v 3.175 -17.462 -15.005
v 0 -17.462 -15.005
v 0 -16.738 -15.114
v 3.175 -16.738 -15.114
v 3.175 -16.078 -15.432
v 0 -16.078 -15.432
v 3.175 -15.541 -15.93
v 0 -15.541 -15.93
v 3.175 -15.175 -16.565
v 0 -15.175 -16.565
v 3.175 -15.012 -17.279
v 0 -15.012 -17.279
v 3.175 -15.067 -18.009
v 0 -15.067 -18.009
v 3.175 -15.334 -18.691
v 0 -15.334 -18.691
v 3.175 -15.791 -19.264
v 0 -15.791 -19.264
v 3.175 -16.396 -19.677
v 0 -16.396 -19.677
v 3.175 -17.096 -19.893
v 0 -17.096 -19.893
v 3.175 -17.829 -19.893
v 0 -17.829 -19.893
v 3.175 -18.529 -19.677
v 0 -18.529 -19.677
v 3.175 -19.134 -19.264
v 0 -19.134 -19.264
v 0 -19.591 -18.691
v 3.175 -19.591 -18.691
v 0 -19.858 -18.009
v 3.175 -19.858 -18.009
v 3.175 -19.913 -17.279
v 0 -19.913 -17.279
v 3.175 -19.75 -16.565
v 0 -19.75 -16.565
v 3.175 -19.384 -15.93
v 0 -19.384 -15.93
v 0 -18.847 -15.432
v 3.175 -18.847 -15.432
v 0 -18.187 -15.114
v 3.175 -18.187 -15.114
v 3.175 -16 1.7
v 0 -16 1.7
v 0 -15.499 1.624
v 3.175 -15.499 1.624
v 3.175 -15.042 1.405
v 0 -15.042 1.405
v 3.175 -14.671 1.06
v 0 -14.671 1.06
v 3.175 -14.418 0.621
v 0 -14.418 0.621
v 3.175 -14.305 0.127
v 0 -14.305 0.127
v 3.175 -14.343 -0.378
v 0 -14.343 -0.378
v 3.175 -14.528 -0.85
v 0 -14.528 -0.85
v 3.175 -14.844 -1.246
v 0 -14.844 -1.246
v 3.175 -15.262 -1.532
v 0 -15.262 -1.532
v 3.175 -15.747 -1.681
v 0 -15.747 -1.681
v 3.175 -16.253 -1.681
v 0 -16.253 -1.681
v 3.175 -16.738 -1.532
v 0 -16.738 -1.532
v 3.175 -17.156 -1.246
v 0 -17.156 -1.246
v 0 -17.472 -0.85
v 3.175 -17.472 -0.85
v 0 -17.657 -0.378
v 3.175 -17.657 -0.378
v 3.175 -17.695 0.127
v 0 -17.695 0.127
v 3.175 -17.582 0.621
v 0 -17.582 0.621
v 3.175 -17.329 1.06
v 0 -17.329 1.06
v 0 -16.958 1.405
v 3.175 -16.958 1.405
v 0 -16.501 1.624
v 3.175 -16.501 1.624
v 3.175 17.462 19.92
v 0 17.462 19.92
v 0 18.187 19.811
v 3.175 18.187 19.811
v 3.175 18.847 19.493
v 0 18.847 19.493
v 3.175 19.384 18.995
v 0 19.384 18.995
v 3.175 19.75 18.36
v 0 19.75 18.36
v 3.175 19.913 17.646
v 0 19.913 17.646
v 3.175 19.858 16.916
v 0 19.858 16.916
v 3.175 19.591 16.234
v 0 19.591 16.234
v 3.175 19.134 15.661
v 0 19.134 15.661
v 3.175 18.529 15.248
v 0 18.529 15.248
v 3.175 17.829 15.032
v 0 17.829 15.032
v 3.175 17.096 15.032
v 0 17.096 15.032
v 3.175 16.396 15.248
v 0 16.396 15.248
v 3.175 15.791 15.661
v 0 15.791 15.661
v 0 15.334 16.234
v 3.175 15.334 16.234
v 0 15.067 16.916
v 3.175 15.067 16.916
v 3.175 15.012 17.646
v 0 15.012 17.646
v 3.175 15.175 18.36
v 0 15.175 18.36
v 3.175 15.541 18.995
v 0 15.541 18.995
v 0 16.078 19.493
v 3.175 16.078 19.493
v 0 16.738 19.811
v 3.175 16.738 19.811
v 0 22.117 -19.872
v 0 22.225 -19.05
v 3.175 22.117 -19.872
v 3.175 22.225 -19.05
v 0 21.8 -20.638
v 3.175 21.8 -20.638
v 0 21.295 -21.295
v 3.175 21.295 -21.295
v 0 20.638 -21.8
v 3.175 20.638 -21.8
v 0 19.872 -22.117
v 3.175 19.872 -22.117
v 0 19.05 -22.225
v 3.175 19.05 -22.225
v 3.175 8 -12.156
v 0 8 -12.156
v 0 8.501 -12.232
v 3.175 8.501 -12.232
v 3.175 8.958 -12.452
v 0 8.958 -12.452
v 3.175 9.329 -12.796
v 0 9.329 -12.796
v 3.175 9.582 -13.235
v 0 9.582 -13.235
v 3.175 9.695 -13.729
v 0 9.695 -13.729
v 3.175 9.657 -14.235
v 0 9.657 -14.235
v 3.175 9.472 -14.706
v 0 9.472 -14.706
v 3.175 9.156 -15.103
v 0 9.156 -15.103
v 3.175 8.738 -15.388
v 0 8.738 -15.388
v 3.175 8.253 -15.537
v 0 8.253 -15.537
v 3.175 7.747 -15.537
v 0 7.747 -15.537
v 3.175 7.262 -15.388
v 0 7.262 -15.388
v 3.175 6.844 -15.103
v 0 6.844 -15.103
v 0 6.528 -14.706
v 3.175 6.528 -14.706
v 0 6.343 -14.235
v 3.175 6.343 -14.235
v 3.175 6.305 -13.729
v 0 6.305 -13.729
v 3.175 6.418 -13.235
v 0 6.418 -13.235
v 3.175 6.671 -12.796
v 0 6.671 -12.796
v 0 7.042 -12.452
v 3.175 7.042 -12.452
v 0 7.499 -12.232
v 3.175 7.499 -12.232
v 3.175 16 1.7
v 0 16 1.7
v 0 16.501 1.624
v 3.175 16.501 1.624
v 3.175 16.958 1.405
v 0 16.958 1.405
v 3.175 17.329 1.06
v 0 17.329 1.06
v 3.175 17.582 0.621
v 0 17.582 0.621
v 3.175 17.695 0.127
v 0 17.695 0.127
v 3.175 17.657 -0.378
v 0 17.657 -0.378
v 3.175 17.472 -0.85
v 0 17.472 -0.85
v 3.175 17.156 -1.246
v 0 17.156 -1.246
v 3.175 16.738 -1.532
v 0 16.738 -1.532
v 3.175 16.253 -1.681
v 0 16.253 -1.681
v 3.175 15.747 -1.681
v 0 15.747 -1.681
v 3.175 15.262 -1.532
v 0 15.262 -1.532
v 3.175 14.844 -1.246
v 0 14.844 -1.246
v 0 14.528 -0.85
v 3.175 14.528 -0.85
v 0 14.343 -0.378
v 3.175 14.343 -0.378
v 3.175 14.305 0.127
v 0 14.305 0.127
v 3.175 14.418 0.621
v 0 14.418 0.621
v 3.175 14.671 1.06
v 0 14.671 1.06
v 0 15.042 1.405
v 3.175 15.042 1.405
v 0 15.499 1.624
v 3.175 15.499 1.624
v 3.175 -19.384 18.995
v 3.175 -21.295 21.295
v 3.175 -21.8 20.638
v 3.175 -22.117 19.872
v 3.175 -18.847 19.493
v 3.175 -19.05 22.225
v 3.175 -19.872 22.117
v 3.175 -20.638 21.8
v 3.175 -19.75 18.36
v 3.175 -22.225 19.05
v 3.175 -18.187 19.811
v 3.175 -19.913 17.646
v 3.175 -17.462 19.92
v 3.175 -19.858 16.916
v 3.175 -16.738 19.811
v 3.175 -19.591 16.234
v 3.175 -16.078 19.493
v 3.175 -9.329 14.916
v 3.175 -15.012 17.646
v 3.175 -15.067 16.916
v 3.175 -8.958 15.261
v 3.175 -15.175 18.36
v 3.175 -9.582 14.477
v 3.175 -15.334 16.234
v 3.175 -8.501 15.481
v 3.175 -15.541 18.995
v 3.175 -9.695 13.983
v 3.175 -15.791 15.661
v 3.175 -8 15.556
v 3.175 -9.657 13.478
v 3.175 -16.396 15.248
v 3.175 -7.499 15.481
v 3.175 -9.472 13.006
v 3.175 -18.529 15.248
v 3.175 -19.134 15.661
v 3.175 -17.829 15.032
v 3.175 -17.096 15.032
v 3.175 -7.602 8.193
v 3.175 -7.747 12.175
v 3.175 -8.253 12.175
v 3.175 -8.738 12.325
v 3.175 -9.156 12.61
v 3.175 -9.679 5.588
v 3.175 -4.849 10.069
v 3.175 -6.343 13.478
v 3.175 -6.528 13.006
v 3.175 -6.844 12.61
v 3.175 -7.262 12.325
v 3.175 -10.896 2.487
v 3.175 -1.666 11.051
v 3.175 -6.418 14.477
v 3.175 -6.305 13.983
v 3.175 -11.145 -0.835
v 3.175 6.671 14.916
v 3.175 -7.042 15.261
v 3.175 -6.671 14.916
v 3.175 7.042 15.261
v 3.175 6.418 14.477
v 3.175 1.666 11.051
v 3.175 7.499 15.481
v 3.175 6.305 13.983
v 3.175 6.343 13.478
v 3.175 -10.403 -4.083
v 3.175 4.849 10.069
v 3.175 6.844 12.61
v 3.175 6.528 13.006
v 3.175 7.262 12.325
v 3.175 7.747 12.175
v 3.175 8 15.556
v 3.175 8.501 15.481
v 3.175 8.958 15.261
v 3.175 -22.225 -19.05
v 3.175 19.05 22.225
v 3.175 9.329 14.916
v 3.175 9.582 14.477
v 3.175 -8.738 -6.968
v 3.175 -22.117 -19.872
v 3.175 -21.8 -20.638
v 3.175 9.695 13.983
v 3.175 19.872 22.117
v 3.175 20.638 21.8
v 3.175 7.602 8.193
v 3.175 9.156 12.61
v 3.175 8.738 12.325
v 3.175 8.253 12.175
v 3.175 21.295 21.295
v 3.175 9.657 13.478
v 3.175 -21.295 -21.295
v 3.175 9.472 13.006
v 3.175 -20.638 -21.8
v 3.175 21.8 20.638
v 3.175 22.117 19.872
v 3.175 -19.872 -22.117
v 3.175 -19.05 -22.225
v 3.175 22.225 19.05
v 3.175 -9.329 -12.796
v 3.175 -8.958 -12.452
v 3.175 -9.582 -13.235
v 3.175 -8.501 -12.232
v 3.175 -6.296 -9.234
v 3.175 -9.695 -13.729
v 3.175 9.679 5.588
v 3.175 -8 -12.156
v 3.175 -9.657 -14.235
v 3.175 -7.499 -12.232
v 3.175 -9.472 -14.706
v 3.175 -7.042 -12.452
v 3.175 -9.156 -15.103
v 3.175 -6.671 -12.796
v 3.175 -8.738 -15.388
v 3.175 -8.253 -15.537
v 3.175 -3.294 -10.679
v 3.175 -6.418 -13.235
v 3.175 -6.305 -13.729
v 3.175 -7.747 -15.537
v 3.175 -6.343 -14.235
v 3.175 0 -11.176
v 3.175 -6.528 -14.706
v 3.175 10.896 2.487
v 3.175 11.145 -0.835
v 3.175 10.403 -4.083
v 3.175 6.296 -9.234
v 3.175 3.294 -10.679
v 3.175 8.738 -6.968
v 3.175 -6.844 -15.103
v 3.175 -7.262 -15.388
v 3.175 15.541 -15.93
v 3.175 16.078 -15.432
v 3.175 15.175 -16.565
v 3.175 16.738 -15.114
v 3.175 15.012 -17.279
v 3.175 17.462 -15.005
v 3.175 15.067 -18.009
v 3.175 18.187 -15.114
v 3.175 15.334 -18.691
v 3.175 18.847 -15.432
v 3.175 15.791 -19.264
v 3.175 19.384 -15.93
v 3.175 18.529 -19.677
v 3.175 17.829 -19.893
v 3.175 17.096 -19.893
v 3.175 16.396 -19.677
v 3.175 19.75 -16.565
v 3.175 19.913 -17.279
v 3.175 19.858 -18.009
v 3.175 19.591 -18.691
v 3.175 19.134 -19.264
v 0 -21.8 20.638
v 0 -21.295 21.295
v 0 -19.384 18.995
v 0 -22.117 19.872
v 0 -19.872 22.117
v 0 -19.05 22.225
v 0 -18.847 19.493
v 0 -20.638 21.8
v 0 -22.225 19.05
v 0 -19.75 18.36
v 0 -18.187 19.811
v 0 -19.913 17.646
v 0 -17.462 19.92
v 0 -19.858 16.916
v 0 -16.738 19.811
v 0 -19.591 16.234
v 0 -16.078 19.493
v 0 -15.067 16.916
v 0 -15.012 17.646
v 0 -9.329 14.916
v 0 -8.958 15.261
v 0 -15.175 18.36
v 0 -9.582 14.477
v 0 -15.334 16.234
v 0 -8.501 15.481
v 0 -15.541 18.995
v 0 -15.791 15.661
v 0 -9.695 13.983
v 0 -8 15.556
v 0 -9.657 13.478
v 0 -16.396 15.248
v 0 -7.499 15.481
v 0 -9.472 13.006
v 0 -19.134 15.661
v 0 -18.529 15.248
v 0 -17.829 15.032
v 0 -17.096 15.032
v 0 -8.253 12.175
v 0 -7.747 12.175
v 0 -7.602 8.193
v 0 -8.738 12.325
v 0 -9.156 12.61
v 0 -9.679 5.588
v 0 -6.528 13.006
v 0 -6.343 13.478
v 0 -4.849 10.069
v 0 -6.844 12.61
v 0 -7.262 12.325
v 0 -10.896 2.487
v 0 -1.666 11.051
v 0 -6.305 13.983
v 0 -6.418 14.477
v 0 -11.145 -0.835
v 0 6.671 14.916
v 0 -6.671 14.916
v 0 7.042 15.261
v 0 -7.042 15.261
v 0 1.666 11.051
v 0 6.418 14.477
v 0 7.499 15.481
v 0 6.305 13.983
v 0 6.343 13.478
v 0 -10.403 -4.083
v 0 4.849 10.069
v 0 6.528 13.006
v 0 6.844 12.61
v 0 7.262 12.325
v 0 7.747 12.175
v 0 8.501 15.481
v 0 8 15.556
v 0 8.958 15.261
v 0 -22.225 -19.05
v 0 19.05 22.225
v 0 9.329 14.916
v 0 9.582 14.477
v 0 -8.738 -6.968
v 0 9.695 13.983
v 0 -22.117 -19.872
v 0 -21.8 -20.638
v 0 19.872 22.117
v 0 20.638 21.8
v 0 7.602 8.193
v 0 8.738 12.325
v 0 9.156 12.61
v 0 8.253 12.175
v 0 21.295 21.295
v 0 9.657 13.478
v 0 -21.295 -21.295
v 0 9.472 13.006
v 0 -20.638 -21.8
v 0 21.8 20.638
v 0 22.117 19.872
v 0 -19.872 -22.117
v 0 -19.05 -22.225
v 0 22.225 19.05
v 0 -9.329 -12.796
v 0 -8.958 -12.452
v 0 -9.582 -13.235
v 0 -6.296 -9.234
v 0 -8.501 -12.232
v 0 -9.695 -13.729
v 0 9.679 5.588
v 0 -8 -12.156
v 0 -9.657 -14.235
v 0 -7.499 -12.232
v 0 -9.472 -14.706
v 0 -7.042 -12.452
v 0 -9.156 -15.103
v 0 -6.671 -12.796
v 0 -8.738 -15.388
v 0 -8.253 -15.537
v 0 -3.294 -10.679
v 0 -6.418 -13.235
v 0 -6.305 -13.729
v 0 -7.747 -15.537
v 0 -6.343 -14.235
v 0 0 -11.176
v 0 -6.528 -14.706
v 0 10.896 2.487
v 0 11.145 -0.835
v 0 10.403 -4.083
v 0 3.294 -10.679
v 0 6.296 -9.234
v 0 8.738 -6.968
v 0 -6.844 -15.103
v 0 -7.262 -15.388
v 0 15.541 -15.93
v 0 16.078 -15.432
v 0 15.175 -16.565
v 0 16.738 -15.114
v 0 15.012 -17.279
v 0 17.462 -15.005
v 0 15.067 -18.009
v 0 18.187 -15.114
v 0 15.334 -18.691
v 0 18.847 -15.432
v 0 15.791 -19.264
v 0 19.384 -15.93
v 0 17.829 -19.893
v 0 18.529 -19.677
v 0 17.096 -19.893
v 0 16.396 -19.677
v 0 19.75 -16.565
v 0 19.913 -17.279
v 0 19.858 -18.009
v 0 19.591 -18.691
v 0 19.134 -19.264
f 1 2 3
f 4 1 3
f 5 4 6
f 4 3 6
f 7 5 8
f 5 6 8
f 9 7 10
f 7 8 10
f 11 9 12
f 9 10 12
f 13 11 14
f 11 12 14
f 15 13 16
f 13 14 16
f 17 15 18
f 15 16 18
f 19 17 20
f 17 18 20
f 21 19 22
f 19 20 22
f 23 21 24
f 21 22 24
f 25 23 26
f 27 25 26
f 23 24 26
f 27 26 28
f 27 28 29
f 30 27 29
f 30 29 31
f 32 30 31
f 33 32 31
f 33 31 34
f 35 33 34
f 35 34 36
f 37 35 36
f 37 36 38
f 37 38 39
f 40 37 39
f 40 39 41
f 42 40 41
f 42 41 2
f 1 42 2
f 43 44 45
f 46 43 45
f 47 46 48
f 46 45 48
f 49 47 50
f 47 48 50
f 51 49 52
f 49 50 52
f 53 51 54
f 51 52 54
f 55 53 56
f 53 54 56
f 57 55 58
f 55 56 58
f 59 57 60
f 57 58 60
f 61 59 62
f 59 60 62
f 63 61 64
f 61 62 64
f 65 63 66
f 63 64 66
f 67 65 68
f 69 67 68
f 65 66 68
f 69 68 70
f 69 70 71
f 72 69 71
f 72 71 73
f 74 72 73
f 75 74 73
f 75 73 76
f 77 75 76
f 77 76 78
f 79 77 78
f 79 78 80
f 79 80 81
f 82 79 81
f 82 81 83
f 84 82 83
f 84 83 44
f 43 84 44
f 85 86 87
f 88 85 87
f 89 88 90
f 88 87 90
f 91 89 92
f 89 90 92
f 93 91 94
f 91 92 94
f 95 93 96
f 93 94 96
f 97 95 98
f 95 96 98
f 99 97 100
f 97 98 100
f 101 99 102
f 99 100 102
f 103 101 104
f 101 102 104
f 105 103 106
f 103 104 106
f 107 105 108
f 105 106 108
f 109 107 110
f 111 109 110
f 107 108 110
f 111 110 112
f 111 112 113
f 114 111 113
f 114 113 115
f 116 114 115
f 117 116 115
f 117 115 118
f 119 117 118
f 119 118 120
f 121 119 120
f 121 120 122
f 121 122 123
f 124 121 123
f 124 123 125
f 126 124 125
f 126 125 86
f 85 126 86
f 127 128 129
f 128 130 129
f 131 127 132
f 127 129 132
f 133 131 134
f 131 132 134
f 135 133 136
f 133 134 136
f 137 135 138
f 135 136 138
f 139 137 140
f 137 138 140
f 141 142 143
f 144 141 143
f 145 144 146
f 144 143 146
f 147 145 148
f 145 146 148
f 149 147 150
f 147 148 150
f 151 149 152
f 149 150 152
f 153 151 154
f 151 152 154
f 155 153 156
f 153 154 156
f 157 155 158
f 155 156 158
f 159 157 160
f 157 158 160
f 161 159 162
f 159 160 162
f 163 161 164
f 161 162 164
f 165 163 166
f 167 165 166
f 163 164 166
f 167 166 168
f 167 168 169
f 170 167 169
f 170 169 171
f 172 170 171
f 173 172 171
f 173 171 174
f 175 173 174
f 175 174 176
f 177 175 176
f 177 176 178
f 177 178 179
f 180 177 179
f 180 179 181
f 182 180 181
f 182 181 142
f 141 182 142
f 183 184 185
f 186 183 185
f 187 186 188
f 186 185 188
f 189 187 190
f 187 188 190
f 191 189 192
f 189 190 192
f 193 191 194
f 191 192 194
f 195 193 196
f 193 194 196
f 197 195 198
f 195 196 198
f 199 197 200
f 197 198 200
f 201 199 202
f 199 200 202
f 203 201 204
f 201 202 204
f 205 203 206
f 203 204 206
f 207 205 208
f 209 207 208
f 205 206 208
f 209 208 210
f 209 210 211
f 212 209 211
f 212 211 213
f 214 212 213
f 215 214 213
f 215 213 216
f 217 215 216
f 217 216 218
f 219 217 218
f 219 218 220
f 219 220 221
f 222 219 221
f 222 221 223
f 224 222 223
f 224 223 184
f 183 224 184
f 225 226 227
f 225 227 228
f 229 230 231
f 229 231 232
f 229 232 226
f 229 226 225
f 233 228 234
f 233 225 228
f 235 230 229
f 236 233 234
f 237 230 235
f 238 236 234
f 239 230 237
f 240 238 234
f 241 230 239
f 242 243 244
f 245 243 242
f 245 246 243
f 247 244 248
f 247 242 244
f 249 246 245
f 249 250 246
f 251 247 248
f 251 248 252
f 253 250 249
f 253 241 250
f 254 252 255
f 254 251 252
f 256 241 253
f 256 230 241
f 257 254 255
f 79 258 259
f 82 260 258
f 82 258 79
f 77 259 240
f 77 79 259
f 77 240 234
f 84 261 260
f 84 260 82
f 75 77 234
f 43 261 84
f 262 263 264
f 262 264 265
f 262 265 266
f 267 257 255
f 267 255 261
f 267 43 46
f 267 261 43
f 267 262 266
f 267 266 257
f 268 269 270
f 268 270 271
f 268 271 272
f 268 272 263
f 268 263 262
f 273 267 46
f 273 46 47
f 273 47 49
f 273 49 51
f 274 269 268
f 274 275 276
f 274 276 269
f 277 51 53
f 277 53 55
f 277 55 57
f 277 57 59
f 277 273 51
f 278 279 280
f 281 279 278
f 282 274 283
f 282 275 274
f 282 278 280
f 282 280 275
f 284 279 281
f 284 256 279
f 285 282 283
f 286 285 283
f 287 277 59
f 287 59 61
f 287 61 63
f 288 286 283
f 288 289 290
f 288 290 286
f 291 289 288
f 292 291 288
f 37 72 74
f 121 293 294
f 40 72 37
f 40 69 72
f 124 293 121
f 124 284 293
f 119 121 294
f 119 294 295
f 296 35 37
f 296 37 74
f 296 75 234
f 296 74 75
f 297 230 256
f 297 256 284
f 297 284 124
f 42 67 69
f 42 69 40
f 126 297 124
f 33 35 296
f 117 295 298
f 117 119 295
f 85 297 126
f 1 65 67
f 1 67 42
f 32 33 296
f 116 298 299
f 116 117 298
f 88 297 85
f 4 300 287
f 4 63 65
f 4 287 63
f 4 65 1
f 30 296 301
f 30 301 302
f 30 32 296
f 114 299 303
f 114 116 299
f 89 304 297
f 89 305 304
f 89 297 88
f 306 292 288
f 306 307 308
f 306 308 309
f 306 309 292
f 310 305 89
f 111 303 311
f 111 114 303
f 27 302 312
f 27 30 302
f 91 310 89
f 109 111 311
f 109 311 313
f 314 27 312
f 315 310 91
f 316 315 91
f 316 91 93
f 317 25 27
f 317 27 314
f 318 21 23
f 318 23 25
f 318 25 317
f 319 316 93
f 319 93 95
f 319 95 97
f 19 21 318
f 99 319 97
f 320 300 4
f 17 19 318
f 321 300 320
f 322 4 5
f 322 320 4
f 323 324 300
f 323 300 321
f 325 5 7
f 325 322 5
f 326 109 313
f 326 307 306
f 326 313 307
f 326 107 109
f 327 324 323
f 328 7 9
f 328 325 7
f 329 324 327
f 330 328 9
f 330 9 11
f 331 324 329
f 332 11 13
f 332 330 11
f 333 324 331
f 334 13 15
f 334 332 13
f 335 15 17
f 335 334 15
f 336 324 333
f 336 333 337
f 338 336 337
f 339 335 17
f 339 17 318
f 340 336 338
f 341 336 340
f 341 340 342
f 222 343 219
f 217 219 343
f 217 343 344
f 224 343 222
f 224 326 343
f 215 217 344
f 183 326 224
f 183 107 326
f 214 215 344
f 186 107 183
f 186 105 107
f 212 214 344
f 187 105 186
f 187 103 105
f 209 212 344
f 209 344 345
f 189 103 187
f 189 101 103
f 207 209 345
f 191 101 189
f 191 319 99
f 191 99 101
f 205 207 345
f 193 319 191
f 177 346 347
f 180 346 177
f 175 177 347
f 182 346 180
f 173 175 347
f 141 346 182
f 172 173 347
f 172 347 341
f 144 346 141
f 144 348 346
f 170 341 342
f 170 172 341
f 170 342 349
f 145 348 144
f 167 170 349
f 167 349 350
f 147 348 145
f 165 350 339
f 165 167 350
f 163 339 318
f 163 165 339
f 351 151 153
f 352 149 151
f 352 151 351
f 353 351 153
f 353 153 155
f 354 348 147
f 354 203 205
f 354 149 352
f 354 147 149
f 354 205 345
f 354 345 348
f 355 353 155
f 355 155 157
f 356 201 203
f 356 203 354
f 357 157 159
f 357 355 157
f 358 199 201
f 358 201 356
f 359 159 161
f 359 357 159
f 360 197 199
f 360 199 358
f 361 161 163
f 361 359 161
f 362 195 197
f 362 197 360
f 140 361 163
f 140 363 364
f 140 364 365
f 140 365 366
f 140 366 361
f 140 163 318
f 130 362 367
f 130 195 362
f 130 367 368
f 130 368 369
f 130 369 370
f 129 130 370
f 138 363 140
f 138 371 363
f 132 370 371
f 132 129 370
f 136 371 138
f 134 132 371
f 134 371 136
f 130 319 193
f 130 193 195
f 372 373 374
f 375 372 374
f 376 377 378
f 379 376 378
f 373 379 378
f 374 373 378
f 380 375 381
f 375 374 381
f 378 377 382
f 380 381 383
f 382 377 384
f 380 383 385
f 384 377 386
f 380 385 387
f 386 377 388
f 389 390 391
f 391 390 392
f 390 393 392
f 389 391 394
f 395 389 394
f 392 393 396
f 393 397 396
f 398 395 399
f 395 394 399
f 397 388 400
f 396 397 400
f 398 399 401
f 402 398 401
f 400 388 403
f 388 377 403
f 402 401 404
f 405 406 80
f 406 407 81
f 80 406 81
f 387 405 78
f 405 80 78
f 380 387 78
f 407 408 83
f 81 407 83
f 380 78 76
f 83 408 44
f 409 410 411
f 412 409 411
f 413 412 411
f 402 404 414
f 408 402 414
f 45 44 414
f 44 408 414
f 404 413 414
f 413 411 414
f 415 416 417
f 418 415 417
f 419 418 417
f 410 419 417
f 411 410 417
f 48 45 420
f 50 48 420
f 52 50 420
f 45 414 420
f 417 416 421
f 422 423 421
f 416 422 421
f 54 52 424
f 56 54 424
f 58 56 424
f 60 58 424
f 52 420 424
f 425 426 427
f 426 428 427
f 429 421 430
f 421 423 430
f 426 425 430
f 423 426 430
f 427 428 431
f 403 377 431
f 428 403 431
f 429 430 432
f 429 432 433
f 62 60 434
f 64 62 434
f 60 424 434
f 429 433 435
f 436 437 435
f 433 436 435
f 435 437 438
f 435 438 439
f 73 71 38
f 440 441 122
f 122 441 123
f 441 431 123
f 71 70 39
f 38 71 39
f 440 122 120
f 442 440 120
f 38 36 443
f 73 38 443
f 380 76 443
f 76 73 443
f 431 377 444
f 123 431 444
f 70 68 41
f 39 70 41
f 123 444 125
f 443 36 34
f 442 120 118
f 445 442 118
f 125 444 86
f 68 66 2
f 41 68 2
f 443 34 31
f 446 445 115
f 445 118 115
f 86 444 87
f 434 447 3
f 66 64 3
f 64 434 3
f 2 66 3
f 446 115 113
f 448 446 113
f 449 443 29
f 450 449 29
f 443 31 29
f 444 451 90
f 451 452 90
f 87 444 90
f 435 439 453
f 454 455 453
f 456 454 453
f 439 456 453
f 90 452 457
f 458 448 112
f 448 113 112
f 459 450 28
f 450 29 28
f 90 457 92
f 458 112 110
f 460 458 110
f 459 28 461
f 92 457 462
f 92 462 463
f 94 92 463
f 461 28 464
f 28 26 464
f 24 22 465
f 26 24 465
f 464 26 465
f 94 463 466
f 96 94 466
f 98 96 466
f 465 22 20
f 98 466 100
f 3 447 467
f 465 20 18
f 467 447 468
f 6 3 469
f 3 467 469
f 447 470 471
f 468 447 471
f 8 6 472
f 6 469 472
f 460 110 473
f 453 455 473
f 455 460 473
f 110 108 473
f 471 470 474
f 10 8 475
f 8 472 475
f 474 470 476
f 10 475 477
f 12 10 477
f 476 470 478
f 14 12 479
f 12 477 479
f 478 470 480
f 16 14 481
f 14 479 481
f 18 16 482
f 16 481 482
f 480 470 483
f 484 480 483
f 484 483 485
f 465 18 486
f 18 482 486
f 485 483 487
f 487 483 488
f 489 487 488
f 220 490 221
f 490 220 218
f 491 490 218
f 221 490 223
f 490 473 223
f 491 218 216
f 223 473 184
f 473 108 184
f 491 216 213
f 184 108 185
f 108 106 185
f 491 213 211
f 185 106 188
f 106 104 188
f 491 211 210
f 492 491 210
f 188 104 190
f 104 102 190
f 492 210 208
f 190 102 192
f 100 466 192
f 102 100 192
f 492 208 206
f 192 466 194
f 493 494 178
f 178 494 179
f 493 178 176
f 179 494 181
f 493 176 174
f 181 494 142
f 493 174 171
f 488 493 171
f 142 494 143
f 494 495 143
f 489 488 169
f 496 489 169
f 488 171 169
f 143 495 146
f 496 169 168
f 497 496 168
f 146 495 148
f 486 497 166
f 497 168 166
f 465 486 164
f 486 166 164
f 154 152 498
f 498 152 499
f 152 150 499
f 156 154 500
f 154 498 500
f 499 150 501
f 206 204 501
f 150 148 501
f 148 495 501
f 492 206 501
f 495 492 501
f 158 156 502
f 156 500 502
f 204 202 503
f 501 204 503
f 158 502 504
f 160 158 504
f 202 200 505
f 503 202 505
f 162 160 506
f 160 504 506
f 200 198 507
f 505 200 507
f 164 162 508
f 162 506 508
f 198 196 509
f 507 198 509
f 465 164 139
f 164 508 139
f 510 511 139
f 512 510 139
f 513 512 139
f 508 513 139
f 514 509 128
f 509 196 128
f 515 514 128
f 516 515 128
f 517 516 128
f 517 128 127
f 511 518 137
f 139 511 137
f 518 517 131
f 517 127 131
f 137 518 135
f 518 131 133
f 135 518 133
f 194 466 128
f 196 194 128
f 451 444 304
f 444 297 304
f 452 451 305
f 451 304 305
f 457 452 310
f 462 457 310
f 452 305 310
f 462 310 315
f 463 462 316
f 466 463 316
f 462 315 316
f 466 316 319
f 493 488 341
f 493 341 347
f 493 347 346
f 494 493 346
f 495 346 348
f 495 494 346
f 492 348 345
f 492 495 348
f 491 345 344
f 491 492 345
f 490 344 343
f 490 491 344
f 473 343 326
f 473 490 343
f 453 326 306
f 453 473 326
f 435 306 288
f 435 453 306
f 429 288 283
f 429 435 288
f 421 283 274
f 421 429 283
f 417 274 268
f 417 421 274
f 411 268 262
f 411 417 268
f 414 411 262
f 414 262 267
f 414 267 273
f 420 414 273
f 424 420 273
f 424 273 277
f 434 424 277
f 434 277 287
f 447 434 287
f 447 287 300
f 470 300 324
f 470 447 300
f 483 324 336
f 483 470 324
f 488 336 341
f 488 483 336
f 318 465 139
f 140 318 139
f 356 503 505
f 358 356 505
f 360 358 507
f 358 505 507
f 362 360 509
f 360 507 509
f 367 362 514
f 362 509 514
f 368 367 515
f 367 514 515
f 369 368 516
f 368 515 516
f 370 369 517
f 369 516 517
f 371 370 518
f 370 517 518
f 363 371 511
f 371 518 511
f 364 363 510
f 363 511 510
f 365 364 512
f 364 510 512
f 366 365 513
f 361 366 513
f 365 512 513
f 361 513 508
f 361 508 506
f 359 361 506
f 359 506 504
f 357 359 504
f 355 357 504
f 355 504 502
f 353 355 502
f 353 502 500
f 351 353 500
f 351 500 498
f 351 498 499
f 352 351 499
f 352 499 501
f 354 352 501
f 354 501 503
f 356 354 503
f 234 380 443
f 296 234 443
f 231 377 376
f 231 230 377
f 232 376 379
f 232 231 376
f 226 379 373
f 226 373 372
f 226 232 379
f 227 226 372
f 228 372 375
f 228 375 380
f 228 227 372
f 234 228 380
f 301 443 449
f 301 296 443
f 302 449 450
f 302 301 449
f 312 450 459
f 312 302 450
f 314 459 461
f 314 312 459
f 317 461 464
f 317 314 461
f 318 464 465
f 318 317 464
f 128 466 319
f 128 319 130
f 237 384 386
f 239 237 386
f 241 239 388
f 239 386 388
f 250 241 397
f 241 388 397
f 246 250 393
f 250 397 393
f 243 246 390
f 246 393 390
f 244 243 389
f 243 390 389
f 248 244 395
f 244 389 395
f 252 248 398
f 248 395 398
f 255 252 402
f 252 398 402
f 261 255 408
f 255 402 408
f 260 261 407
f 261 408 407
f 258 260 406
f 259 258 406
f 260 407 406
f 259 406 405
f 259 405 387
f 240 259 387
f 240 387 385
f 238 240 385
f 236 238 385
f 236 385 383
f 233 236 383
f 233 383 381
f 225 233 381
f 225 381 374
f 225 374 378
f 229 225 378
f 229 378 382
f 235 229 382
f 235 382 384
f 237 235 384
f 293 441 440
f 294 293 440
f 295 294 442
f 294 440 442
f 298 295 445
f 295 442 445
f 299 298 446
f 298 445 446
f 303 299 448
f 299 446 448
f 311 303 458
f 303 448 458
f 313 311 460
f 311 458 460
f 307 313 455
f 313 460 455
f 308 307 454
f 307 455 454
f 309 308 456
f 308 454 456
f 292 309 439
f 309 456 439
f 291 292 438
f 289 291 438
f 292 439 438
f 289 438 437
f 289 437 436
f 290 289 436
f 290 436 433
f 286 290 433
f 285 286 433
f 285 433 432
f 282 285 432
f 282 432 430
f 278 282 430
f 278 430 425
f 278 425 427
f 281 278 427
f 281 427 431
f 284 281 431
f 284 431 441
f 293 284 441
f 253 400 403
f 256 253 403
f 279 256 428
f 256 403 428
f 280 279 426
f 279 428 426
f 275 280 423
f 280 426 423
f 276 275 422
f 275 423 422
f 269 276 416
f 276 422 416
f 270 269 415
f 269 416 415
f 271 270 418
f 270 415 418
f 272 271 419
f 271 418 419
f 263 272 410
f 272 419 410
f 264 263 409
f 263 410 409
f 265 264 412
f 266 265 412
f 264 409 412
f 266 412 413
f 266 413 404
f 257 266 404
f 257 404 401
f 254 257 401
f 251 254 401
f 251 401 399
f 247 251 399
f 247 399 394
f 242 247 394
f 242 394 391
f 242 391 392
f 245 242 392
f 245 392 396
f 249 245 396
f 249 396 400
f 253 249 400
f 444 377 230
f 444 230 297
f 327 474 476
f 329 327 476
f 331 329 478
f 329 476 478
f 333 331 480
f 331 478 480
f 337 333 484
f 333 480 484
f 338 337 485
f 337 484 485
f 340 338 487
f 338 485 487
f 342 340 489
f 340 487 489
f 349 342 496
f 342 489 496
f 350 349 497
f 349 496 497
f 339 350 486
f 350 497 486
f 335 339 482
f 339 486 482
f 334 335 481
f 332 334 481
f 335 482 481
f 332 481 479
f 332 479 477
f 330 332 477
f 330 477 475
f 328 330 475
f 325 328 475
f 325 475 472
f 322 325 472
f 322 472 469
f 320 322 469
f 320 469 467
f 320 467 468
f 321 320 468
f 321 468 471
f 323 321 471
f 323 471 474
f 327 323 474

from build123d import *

# Parameters (mm, degrees)
SKETCH1_W                        = 44.45
SKETCH1_H                        = 44.45
SKETCH1_R                        = 11.176
BOSS_EXTRUDE1_DEPTH              = 3.175
F_10_0_1935_DIAMETER_HOLE1_D     = 4.9149
F_10_0_1935_DIAMETER_HOLE1_DEPTH = 3.175
M3_CLEARANCE_HOLE1_D             = 3.4
M3_CLEARANCE_HOLE1_DEPTH         = 3.175
FILLET1_R                        = 3.175


with BuildPart() as part:
    # Sketch1 → Boss-Extrude1 (new body)
    with BuildSketch(Plane(origin=(0, 0, 0), x_dir=(0, 0, -1), z_dir=(1, 0, 0))):
        Rectangle(SKETCH1_W, SKETCH1_H)
        Circle(SKETCH1_R, mode=Mode.SUBTRACT)
    extrude(amount=BOSS_EXTRUDE1_DEPTH)

    # #10 (0.1935) Diameter Hole1
    with Locations(Plane(origin=(3.175, 0, 0), x_dir=(0, 0, -1), z_dir=(1, 0, 0))):
        with Locations((-17.4625, 17.4625), (17.4625, 17.4625), (17.4625, -17.4625), (-17.4625, -17.4625)):
            Hole(F_10_0_1935_DIAMETER_HOLE1_D / 2, depth=F_10_0_1935_DIAMETER_HOLE1_DEPTH)

    # M3 Clearance Hole1
    with Locations(Plane(origin=(3.175, 0, 0), x_dir=(0, 0, -1), z_dir=(1, 0, 0))):
        with Locations((-13.856406461, 8), (0, 16), (13.856406461, 8), (13.856406461, -8), (0, -16), (-13.856406461, -8)):
            Hole(M3_CLEARANCE_HOLE1_D / 2, depth=M3_CLEARANCE_HOLE1_DEPTH)

    # Fillet1
    fillet1_edges = [part.edges().sort_by_distance(p)[0] for p in [
        (1.5875, 22.225, 22.225),
        (1.5875, 22.225, -22.225),
        (1.5875, -22.225, -22.225),
        (1.5875, -22.225, 22.225),
    ]]
    fillet(fillet1_edges, radius=FILLET1_R)


solid = part.part
